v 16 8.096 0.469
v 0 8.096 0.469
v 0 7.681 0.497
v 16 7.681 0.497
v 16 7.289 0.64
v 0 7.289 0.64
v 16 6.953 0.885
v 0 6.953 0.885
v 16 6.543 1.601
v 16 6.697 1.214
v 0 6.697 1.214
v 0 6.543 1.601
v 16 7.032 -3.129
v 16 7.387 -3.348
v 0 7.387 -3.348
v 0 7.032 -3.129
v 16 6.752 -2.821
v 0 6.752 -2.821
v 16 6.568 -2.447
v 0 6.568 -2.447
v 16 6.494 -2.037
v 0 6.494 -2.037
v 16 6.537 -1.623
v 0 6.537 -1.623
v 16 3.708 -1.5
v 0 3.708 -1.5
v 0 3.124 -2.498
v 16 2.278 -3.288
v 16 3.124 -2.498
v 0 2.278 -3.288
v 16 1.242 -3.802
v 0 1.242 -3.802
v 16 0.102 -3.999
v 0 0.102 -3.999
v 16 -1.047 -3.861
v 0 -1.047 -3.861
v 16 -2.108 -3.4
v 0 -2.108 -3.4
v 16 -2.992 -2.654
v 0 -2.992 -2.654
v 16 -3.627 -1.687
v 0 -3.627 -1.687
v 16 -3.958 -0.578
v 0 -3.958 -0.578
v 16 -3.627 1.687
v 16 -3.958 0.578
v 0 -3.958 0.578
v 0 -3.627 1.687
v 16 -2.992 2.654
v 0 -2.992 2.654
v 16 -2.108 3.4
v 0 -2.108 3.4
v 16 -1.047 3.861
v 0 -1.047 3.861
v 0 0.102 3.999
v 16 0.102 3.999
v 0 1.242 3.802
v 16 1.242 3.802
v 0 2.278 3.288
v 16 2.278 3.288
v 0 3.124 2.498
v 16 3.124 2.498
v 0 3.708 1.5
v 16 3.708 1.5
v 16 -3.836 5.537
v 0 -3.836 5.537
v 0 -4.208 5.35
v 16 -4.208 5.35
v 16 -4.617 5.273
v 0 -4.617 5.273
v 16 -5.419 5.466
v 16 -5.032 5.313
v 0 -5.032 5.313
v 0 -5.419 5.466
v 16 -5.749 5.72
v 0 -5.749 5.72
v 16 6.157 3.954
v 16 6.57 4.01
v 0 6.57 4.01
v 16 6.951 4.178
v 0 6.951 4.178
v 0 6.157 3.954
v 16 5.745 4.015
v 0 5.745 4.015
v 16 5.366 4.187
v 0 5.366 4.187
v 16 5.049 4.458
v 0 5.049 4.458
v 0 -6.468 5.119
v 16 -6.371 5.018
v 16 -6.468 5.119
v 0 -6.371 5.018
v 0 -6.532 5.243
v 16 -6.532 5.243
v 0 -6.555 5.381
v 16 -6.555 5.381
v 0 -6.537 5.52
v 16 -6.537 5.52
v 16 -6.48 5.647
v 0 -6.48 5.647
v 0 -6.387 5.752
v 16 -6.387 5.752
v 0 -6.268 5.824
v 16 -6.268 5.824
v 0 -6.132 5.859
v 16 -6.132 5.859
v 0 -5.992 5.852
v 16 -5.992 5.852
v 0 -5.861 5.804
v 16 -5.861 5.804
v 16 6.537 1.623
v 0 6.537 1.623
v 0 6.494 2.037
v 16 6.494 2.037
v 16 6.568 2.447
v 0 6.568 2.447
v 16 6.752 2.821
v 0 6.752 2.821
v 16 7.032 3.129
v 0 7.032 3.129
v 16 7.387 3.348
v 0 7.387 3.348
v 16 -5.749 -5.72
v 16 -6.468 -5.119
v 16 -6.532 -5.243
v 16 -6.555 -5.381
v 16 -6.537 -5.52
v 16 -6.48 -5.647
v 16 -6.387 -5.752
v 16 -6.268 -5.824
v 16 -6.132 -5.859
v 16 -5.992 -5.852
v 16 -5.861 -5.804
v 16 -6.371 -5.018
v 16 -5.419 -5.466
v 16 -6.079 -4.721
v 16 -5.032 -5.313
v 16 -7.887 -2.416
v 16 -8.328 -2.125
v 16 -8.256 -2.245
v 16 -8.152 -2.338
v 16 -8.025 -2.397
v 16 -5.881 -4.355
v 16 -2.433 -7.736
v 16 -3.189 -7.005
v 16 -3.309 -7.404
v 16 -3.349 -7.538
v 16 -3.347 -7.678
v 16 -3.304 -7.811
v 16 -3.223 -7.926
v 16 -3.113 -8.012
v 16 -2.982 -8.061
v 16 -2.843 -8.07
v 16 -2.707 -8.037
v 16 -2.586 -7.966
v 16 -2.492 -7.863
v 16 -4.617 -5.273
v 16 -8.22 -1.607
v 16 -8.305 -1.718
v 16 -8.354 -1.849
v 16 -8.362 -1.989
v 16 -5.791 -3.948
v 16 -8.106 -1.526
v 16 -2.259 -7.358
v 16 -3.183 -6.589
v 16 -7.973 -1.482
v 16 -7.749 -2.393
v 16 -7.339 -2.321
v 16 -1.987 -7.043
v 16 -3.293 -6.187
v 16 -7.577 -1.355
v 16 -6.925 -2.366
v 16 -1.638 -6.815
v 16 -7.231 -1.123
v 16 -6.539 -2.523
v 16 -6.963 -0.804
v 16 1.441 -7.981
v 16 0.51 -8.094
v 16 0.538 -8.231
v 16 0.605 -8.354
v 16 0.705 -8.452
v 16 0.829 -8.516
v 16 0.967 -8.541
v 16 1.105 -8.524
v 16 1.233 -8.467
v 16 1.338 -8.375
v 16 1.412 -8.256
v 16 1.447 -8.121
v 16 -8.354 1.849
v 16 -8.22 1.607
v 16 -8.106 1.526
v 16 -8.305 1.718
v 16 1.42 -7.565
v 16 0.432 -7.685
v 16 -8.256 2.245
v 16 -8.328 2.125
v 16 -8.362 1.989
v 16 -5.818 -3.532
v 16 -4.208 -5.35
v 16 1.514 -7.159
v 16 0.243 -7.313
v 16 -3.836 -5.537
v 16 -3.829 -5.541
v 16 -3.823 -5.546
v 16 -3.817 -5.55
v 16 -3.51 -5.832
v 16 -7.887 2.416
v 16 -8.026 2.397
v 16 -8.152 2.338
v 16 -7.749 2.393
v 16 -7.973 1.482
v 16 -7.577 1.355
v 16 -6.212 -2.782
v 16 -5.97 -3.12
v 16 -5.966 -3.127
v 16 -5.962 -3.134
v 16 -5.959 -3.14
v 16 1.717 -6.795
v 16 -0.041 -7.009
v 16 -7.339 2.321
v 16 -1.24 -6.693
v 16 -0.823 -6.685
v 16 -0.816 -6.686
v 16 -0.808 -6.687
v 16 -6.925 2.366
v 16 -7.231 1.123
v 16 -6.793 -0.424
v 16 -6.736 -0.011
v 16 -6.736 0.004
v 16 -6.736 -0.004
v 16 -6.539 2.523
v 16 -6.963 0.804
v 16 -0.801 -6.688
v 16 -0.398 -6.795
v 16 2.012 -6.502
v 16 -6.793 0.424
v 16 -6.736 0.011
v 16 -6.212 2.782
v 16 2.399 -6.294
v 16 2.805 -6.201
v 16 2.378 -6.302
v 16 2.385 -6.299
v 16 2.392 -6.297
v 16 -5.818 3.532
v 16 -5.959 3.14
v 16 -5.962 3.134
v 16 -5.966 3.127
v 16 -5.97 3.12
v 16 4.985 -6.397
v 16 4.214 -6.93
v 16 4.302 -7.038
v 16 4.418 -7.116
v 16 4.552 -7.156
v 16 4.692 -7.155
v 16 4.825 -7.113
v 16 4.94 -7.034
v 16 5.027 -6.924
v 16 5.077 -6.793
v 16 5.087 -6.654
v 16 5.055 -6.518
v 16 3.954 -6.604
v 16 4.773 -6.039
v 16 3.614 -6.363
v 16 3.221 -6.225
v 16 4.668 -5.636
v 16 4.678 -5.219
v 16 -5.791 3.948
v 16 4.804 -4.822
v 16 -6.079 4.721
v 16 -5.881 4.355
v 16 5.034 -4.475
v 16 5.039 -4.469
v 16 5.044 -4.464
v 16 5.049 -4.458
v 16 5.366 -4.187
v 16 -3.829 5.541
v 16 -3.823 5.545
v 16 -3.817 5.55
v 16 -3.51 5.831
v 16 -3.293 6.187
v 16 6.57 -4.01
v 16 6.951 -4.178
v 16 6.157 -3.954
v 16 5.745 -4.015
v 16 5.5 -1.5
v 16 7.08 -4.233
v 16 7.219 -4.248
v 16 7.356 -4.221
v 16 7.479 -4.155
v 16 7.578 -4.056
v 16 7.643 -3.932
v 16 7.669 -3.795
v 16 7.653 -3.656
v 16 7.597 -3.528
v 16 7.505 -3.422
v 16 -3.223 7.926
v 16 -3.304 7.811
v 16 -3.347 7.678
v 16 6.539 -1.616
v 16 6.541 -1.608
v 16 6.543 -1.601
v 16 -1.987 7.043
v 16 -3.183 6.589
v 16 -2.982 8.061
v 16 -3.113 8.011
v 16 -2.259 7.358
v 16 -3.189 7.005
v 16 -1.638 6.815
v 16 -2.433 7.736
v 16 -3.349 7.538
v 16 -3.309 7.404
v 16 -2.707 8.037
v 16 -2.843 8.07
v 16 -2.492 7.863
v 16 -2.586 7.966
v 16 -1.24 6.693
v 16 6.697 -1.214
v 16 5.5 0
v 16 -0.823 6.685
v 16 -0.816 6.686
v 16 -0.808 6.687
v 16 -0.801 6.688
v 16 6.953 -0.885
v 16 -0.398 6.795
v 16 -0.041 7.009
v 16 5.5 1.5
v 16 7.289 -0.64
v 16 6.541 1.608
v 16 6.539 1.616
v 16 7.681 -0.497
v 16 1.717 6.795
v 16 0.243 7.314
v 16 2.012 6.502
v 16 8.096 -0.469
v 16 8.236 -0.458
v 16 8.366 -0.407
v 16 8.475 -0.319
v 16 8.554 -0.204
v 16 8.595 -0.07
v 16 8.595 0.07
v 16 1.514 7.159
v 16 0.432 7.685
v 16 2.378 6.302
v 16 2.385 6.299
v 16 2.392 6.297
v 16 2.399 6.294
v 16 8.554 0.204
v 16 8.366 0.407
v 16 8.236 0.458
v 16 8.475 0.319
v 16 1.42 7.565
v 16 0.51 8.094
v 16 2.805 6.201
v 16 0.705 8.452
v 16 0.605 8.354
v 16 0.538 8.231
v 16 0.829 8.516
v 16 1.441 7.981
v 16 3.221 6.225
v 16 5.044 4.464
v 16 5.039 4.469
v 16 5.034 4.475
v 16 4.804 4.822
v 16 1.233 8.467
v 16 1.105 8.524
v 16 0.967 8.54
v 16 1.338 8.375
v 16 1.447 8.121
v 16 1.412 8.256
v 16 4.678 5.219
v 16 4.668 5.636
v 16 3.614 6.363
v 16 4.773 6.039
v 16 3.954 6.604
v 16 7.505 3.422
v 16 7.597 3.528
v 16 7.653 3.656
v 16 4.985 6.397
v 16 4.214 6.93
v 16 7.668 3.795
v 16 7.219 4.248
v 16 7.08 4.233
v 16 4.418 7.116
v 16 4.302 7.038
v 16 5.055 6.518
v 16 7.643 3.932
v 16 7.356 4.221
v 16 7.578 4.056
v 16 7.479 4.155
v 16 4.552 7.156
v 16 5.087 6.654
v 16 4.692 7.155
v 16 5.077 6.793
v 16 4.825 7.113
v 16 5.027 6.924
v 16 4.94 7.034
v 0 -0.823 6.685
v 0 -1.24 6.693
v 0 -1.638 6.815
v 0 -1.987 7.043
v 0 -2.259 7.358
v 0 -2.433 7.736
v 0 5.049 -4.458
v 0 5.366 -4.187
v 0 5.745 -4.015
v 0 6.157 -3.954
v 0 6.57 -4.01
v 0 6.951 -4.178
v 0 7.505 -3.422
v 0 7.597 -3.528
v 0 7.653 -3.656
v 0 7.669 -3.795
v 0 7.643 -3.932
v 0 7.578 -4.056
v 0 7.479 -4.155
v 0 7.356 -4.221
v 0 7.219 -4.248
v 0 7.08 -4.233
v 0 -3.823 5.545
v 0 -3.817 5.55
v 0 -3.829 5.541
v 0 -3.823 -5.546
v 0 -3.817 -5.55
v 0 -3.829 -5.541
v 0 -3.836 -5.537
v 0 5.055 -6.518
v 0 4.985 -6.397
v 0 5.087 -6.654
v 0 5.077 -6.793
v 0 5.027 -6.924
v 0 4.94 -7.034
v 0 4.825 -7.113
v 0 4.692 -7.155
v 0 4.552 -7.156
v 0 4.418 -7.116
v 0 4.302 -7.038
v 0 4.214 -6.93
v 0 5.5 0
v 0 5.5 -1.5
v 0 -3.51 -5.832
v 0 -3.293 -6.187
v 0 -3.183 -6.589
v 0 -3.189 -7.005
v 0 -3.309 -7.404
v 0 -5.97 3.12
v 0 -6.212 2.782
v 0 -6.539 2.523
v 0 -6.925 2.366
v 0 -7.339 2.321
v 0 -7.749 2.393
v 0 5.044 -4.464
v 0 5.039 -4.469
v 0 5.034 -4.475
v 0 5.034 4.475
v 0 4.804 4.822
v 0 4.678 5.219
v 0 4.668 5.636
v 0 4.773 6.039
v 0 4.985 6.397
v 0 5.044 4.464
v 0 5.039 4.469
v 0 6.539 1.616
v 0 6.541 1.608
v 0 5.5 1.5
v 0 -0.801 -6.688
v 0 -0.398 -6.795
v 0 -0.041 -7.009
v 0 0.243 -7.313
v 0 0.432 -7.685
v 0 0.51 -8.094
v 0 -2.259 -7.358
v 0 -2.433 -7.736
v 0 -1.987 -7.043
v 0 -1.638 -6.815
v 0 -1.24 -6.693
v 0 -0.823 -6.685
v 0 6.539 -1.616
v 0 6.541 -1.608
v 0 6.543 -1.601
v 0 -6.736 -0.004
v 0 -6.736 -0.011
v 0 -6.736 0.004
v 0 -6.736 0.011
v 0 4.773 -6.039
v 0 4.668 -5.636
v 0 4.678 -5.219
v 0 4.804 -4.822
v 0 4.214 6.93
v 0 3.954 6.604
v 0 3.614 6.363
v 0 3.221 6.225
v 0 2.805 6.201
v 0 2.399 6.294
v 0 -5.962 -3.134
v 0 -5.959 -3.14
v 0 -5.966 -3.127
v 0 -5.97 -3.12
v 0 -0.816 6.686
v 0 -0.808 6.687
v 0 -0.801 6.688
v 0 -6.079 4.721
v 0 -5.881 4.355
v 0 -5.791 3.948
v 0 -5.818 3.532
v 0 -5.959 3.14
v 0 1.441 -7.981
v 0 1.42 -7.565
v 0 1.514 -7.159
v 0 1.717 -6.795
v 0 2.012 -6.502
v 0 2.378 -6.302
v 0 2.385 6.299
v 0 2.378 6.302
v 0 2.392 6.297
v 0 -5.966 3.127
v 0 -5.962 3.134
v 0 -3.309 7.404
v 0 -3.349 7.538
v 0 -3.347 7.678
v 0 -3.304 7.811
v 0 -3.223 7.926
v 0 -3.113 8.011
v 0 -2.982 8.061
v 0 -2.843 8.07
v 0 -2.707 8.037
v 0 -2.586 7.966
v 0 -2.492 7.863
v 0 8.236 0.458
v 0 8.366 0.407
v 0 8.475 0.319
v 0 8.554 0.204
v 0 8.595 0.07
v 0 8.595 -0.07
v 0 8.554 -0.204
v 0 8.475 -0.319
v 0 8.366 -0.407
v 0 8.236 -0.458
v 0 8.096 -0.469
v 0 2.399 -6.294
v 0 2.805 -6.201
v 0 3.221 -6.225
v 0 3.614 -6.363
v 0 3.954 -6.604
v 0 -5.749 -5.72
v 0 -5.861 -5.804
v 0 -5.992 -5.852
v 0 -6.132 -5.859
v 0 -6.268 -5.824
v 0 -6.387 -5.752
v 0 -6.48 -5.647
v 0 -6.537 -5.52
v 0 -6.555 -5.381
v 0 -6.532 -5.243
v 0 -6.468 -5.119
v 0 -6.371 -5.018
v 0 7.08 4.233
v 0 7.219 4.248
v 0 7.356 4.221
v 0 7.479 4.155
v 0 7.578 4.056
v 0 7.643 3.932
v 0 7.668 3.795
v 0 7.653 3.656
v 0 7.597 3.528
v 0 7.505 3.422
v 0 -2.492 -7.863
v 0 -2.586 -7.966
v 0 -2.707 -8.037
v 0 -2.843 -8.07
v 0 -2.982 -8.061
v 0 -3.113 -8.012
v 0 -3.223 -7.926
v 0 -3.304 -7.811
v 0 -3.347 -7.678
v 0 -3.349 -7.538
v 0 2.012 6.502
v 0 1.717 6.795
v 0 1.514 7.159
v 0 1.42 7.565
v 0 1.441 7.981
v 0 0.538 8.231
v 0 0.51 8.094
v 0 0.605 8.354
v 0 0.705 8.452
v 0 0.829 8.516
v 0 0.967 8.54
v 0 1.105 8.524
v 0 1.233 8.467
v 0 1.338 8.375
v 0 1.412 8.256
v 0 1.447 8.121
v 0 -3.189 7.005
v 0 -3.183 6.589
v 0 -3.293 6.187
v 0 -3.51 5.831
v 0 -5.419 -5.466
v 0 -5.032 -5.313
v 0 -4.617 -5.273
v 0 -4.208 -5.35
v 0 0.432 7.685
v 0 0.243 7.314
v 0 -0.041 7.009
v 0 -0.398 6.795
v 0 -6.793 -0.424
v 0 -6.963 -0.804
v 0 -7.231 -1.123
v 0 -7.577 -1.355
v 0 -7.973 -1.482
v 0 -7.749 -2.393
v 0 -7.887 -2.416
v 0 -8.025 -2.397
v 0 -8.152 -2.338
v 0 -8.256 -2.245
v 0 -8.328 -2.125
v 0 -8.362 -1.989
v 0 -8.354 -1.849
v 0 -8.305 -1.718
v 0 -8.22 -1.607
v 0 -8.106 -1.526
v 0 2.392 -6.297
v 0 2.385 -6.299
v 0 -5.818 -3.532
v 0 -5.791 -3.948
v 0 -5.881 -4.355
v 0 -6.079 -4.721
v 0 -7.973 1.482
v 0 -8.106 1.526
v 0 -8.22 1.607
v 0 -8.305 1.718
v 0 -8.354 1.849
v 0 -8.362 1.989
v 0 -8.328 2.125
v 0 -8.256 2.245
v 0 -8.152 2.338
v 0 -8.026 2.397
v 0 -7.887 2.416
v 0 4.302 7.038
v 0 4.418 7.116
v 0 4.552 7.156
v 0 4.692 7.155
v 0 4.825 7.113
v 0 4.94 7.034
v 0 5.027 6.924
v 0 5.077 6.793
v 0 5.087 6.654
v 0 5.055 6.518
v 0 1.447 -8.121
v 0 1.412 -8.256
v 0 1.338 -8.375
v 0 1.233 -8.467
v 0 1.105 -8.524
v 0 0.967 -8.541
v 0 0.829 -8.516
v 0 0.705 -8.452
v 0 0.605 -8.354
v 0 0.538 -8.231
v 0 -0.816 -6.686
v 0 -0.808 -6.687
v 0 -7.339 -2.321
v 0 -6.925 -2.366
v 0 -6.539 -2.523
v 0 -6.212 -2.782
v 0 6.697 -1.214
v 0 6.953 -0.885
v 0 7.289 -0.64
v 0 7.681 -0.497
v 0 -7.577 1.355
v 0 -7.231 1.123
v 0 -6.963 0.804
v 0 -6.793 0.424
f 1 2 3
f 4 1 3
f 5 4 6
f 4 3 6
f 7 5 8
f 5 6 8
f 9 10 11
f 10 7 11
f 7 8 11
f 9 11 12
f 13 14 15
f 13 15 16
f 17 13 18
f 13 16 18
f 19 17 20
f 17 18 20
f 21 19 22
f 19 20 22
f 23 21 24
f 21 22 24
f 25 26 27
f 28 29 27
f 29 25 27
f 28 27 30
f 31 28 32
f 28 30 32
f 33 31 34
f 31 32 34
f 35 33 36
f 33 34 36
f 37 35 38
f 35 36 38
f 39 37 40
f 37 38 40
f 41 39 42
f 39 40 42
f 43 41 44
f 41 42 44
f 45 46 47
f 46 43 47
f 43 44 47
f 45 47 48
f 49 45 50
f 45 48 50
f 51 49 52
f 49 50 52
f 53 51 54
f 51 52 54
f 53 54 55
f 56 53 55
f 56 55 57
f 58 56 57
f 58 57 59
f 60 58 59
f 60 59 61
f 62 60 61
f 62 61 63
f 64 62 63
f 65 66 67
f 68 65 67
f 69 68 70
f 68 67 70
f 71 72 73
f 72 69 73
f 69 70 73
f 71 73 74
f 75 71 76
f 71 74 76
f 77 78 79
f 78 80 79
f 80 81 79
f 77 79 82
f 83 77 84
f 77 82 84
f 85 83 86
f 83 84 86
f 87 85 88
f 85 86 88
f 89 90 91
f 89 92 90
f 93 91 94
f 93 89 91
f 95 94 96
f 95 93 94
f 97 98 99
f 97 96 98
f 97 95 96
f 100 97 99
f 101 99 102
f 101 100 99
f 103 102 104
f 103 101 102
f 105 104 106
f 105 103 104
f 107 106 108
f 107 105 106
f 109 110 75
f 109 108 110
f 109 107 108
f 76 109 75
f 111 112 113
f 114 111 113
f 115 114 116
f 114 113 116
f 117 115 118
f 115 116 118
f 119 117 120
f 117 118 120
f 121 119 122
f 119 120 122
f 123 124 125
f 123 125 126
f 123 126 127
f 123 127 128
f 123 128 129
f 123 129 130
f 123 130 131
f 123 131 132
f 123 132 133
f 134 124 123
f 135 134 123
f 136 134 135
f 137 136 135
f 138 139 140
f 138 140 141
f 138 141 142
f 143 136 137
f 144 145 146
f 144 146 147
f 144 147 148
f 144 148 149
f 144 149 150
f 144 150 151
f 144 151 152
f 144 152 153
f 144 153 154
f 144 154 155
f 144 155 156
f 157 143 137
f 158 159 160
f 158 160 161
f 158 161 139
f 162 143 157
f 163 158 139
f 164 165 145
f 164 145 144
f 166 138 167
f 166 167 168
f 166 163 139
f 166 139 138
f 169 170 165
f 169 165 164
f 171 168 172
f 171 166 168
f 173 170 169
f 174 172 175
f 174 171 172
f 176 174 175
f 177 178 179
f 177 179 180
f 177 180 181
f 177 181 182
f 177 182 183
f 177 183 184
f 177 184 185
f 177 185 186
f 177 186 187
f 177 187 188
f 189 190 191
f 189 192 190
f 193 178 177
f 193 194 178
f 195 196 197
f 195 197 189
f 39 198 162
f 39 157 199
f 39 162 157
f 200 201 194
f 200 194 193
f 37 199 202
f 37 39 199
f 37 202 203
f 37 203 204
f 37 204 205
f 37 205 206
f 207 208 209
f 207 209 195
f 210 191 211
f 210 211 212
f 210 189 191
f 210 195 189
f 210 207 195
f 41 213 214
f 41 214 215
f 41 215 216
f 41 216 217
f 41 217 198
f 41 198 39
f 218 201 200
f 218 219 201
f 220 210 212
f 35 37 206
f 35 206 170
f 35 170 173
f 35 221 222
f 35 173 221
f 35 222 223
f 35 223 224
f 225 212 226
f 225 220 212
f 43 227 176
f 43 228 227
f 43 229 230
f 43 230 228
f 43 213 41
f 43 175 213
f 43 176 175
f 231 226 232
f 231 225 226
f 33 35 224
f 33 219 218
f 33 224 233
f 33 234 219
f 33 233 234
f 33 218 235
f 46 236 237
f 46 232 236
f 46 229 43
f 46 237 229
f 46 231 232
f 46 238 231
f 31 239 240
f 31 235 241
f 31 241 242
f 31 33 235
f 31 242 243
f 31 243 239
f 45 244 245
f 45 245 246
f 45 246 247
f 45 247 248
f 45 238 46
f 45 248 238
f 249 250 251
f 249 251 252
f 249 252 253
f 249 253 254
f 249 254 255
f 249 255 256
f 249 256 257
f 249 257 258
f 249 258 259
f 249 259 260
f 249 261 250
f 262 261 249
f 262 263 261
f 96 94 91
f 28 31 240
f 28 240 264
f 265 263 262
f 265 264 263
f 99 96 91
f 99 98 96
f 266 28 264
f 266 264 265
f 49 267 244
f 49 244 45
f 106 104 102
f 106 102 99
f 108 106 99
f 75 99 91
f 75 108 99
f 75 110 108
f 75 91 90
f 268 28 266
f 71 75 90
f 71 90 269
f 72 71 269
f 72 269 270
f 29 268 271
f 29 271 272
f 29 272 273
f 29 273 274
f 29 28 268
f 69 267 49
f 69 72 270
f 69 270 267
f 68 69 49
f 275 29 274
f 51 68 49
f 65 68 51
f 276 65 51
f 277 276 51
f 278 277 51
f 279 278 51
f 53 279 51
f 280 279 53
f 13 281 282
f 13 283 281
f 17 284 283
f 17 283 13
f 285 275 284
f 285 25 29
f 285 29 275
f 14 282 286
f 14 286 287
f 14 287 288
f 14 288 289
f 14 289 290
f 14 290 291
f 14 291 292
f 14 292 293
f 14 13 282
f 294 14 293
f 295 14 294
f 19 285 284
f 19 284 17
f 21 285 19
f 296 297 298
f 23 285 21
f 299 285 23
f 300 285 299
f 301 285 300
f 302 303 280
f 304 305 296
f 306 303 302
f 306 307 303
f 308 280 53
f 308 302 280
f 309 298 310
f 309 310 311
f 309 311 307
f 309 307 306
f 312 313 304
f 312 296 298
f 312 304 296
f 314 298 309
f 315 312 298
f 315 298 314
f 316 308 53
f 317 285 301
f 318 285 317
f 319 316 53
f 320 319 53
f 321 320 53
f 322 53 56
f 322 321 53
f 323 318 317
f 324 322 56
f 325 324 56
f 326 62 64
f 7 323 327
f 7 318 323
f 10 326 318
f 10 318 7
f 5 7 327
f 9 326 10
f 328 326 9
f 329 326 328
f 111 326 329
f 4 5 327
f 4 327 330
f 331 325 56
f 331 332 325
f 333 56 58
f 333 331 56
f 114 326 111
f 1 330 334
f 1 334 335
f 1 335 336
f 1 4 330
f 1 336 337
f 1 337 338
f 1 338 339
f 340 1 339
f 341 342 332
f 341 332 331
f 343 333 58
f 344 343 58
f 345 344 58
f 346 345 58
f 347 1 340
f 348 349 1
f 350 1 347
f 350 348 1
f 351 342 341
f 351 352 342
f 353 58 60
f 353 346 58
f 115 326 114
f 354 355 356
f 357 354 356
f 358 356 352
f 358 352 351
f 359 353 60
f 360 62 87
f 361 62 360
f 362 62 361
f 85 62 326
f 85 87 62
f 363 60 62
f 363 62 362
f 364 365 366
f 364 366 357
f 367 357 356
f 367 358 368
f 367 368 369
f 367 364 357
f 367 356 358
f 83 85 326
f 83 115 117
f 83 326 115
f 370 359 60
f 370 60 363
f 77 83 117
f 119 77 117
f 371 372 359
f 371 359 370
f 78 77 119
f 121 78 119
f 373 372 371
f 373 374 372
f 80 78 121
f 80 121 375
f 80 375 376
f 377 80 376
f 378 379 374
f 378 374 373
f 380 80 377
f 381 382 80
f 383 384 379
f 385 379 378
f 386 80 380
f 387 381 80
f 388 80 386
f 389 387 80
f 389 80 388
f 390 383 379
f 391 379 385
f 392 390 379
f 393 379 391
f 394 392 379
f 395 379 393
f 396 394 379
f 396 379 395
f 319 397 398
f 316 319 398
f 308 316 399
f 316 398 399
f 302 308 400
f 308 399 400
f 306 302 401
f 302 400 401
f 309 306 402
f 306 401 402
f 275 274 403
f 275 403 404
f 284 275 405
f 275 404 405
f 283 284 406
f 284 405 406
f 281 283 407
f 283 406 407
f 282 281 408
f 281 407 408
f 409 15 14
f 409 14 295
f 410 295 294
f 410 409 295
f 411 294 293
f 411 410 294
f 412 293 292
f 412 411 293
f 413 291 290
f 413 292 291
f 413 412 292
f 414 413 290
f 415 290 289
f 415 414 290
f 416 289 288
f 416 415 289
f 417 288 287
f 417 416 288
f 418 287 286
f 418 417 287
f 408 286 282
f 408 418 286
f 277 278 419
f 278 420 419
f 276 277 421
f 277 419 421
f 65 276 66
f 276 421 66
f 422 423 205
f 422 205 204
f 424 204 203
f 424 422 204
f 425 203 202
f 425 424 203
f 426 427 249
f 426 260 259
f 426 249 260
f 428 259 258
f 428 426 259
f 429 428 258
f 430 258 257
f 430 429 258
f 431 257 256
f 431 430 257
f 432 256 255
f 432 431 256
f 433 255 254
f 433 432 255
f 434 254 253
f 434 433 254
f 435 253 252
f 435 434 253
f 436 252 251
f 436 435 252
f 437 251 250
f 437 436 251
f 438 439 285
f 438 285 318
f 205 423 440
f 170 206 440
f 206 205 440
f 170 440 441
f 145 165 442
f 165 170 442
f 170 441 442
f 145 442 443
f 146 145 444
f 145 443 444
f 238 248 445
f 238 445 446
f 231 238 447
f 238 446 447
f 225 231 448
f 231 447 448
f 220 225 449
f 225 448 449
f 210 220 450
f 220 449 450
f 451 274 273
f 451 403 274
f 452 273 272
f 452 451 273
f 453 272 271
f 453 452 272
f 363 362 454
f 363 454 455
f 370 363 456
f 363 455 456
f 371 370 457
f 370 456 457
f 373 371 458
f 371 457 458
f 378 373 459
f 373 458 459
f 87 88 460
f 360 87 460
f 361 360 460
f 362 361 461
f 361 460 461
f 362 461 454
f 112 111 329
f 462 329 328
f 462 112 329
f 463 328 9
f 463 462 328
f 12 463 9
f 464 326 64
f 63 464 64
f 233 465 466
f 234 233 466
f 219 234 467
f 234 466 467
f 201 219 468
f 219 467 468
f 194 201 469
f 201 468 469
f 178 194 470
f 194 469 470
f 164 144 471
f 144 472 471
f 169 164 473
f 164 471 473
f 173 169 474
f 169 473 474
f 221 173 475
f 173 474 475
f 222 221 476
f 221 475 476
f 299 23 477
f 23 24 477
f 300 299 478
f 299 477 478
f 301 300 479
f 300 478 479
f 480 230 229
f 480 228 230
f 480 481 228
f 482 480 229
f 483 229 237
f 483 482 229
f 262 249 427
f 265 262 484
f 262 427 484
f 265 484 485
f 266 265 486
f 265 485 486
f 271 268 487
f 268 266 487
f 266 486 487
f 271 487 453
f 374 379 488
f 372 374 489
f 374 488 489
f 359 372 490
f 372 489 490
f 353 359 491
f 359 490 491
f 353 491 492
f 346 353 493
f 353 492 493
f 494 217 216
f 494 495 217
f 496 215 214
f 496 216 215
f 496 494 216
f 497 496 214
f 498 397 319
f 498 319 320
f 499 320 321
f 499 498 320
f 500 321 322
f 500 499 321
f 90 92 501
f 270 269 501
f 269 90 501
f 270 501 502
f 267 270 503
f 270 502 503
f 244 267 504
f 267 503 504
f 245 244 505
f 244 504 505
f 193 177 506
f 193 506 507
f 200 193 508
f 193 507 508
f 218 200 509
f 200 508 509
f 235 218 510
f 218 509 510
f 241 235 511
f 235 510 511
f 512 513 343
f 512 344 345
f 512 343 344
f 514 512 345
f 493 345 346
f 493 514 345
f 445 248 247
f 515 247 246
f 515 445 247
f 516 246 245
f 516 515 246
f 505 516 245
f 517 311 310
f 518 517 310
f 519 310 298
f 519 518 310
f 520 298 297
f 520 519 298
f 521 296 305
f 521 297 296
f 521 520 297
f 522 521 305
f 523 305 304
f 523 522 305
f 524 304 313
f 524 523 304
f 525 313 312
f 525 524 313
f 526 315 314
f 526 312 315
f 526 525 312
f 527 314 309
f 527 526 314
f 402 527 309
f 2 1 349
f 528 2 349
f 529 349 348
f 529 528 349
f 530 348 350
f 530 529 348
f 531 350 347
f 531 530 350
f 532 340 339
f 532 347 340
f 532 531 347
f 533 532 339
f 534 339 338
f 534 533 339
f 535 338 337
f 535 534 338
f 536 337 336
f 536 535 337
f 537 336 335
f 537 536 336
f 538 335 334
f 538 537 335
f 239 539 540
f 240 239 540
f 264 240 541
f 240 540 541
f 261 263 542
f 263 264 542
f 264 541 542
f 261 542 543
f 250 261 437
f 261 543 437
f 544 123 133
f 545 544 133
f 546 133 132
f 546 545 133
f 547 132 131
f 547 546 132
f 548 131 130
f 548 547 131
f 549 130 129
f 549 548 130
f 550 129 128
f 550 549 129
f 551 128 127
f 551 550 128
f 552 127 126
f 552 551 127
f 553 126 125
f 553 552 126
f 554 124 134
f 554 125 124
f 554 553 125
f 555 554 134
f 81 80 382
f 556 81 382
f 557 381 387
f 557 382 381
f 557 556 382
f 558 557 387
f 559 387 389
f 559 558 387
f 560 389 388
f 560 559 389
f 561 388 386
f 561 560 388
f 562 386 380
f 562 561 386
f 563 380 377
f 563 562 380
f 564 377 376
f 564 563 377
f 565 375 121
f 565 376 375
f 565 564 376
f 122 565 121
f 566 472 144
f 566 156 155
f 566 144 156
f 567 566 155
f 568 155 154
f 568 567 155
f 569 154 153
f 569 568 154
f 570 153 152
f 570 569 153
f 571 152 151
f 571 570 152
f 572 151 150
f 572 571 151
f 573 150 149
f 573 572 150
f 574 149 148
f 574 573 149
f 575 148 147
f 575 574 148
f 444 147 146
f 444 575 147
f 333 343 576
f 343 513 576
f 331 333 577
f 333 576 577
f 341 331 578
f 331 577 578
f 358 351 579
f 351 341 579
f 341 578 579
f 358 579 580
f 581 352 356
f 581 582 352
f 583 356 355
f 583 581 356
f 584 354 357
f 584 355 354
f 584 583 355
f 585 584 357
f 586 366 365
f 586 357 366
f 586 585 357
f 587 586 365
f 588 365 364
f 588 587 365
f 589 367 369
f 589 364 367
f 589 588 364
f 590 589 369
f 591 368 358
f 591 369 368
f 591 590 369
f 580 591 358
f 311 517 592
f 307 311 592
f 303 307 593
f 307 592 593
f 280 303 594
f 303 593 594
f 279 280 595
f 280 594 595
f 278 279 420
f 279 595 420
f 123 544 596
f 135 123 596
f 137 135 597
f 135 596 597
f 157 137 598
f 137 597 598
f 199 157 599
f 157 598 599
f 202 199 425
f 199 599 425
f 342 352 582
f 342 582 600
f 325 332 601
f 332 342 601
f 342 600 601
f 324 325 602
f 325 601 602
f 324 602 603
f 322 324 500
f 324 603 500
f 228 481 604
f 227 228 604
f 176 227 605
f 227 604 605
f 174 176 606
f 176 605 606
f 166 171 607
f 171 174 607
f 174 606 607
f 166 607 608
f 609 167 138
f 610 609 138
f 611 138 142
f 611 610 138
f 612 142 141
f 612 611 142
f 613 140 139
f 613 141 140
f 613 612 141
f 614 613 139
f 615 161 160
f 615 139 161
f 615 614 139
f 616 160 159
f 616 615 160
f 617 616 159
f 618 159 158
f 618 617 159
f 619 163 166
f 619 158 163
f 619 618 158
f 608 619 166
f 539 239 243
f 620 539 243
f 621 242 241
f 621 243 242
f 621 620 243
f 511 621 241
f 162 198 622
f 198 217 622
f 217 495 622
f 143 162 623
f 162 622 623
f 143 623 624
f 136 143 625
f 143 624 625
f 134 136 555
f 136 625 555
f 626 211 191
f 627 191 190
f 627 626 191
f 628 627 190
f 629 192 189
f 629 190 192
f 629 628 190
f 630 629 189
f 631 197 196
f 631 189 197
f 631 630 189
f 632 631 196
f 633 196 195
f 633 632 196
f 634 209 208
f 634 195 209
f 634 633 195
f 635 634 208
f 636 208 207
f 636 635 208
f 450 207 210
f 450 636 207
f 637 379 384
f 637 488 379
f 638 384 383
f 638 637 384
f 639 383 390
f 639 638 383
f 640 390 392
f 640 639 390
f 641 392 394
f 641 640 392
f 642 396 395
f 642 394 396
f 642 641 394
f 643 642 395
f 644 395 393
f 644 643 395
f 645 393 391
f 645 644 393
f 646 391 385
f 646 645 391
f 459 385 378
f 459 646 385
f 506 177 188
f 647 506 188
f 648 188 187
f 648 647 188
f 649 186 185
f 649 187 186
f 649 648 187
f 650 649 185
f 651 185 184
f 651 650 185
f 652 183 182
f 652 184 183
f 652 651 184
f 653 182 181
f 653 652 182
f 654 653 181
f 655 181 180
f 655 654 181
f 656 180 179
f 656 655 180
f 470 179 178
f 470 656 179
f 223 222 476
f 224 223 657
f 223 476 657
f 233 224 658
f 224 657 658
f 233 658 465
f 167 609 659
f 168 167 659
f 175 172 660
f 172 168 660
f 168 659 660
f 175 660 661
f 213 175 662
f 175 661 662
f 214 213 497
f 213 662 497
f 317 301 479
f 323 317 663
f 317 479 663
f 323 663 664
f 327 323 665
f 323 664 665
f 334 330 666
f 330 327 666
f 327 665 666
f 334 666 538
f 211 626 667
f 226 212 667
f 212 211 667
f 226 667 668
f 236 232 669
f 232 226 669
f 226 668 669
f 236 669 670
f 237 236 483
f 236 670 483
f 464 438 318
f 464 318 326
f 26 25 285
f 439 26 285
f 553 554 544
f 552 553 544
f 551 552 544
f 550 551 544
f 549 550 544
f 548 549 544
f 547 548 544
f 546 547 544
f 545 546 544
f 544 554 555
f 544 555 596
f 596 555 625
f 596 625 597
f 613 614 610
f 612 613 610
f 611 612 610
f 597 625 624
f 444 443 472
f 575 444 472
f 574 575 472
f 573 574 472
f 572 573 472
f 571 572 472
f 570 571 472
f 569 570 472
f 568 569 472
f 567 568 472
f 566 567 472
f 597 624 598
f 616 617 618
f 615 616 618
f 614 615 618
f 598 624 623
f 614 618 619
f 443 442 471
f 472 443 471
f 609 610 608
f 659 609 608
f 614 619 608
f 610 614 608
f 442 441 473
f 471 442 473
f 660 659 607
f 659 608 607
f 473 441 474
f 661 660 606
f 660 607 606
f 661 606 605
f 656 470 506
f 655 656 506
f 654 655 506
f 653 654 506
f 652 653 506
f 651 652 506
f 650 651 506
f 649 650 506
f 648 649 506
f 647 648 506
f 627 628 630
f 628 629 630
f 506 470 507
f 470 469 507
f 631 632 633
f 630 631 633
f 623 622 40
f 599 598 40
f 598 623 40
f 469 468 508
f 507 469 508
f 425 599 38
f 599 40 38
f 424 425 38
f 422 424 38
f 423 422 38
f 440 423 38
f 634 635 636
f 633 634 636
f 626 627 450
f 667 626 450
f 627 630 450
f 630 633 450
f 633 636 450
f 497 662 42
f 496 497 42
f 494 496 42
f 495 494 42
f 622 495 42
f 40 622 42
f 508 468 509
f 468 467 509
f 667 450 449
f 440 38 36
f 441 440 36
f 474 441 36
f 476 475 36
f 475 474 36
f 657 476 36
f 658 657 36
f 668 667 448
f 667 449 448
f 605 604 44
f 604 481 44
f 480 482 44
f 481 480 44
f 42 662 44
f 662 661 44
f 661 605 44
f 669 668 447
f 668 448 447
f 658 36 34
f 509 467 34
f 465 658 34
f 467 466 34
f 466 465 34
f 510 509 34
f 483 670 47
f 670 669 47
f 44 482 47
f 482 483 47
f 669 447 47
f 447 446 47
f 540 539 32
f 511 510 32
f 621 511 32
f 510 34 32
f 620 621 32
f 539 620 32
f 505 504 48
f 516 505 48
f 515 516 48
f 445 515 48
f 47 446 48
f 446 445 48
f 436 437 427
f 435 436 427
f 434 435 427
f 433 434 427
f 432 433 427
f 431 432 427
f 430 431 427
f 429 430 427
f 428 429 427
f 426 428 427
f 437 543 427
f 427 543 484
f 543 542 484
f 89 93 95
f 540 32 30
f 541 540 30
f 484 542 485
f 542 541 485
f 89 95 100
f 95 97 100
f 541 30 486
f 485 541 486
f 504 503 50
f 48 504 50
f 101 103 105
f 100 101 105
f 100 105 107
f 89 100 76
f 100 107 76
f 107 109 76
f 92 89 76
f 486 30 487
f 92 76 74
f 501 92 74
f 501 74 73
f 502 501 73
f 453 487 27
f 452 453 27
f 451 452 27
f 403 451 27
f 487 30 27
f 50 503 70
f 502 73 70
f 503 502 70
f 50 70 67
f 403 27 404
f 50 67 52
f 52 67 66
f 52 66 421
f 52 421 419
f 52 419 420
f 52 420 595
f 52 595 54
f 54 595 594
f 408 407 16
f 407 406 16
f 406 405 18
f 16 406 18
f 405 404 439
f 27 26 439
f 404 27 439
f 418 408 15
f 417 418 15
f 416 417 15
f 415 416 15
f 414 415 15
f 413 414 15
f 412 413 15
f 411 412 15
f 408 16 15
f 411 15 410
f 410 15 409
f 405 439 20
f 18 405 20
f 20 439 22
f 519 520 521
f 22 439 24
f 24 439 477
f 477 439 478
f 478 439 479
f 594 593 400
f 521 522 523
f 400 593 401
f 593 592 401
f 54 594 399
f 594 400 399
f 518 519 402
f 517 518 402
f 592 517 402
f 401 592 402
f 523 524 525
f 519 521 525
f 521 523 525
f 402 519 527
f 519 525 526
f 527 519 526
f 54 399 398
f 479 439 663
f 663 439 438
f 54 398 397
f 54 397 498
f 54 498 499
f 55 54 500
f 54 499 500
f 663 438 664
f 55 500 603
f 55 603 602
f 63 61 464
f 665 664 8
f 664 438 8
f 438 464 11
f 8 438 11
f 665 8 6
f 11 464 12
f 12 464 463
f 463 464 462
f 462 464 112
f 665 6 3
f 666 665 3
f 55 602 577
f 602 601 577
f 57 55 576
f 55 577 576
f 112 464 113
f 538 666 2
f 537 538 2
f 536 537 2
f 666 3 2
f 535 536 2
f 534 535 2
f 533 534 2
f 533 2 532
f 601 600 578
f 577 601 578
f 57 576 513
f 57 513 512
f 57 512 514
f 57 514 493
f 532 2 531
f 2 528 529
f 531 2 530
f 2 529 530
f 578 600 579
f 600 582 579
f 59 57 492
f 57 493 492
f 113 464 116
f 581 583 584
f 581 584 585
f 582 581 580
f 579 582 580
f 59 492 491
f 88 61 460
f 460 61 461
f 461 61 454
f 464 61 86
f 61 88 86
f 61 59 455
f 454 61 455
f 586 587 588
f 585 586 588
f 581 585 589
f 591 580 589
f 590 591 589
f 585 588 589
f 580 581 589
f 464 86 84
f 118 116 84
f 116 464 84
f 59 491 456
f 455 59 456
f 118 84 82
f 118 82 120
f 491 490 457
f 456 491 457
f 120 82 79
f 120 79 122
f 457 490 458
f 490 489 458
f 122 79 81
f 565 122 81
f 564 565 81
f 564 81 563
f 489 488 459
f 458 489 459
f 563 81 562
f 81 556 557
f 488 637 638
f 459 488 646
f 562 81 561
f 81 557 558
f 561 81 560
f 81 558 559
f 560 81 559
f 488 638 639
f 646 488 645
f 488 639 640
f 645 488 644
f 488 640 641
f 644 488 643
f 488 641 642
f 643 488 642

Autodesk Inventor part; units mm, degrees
ref_plane "YZ Plane" through (0, 0, 0) normal (1, 0, 0) x (0, 1, 0)
ref_plane "XZ Plane" through (0, 0, 0) normal (0, 1, 0) x (-1, 0, 0)
ref_plane "XY Plane" through (0, 0, 0) normal (0, 0, 1) x (1, 0, 0)
sketch "Sketch1" plane through (0, 0, 0) normal (1, 0, 0) x (0, 1, 0)
  arc A0 (3.7081, 1.5) -> (3.7081, -1.5) centre (0, 0) ccw
  arc A1 (6.5427, 1.6009) -> (8.0964, 0.4688) centre (7.99, 1.955) ccw
  arc A2 (8.0964, -0.4688) -> (6.5427, -1.6009) centre (7.99, -1.955) ccw
  arc A3 (8.0964, -0.4688) -> (8.0964, 0.4688) centre (8.13, 0) ccw
  arc A4 (5.0493, 4.458) -> (6.9512, 4.1777) centre (6.1663, 5.4442) ccw
  arc A5 (7.3869, 3.3475) -> (6.9512, 4.1777) centre (7.1988, 3.7782) ccw
  arc A6 (7.3869, 3.3475) -> (6.5372, 1.623) centre (7.9833, 1.9821) ccw
  arc A7 (2.3992, 6.2939) -> (4.2135, 6.9295) centre (2.9299, 7.6862) ccw
  arc A8 (4.9851, 6.3969) -> (4.2135, 6.9295) centre (4.6184, 6.6909) ccw
  arc A9 (4.9851, 6.3969) -> (5.0342, 4.4751) centre (6.1478, 5.4651) ccw
  arc A10 (-0.8006, 6.688) -> (0.5105, 8.0939) centre (-0.9777, 8.1674) ccw
  arc A11 (1.4413, 7.9809) -> (0.5105, 8.0939) centre (0.98, 8.0707) ccw
  arc A12 (1.4413, 7.9809) -> (2.3778, 6.302) centre (2.9038, 7.6961) ccw
  arc A13 (-3.8169, 5.5498) -> (-3.3094, 7.4041) centre (-4.6612, 6.7775) ccw
  arc A14 (-2.4327, 7.7365) -> (-3.3094, 7.4041) centre (-2.8829, 7.6017) ccw
  arc A15 (-2.4327, 7.7365) -> (-0.8232, 6.6852) centre (-1.0053, 8.164) ccw
  arc A16 (-5.9589, 3.1403) -> (-6.3711, 5.018) centre (-7.277, 3.835) ccw
  arc A17 (-5.7494, 5.7198) -> (-6.3711, 5.018) centre (-6.0854, 5.3912) ccw
  arc A18 (-5.7494, 5.7198) -> (-3.8357, 5.5369) centre (-4.6842, 6.7617) ccw
  arc A19 (-6.7357, 0.0114) -> (-7.9734, 1.4824) centre (-8.2257, 0.0139) ccw
  arc A20 (-7.749, 2.3928) -> (-7.9734, 1.4824) centre (-7.8938, 1.9456) ccw
  arc A21 (-7.749, 2.3928) -> (-5.9695, 3.1201) centre (-7.29, 3.8103) ccw
  arc A22 (-5.9695, -3.1201) -> (-7.749, -2.3928) centre (-7.29, -3.8103) ccw
  arc A23 (-7.9734, -1.4824) -> (-7.749, -2.3928) centre (-7.8938, -1.9456) ccw
  arc A24 (-7.9734, -1.4824) -> (-6.7357, -0.0114) centre (-8.2257, -0.0139) ccw
  arc A25 (-3.8357, -5.5369) -> (-5.7494, -5.7198) centre (-4.6842, -6.7617) ccw
  arc A26 (-6.3711, -5.018) -> (-5.7494, -5.7198) centre (-6.0854, -5.3912) ccw
  arc A27 (-6.3711, -5.018) -> (-5.9589, -3.1403) centre (-7.277, -3.835) ccw
  arc A28 (-0.8232, -6.6852) -> (-2.4327, -7.7365) centre (-1.0053, -8.164) ccw
  arc A29 (-3.3094, -7.4041) -> (-2.4327, -7.7365) centre (-2.8829, -7.6017) ccw
  arc A30 (-3.3094, -7.4041) -> (-3.8169, -5.5498) centre (-4.6612, -6.7775) ccw
  arc A31 (2.3778, -6.302) -> (1.4413, -7.9809) centre (2.9038, -7.6961) ccw
  arc A32 (0.5105, -8.0939) -> (1.4413, -7.9809) centre (0.98, -8.0707) ccw
  arc A33 (0.5105, -8.0939) -> (-0.8006, -6.688) centre (-0.9777, -8.1674) ccw
  arc A34 (5.0342, -4.4751) -> (4.9851, -6.3969) centre (6.1478, -5.4651) ccw
  arc A35 (4.2135, -6.9295) -> (4.9851, -6.3969) centre (4.6184, -6.6909) ccw
  arc A36 (4.2135, -6.9295) -> (2.3992, -6.2939) centre (2.9299, -7.6862) ccw
  arc A37 (6.5372, -1.623) -> (7.3869, -3.3475) centre (7.9833, -1.9821) ccw
  arc A38 (6.9512, -4.1777) -> (7.3869, -3.3475) centre (7.1988, -3.7782) ccw
  arc A39 (6.9512, -4.1777) -> (5.0493, -4.458) centre (6.1663, -5.4442) ccw
  arc A40 (6.5427, 1.6009) -> (6.5372, 1.623) centre (0, 0) ccw
  arc A41 (6.5372, -1.623) -> (6.5427, -1.6009) centre (0, 0) ccw
  arc A42 (5.0493, 4.458) -> (5.0342, 4.4751) centre (0, 0) ccw
  arc A43 (2.3992, 6.2939) -> (2.3778, 6.302) centre (0, 0) ccw
  arc A44 (-0.8006, 6.688) -> (-0.8232, 6.6852) centre (0, 0) ccw
  arc A45 (-3.8169, 5.5498) -> (-3.8357, 5.5369) centre (0, 0) ccw
  arc A46 (-5.9589, 3.1403) -> (-5.9695, 3.1201) centre (0, 0) ccw
  arc A47 (-6.7357, 0.0114) -> (-6.7357, -0.0114) centre (0, 0) ccw
  arc A48 (-5.9695, -3.1201) -> (-5.9589, -3.1403) centre (0, 0) ccw
  arc A49 (-3.8357, -5.5369) -> (-3.8169, -5.5498) centre (0, 0) ccw
  arc A50 (-0.8232, -6.6852) -> (-0.8006, -6.688) centre (0, 0) ccw
  arc A51 (2.3778, -6.302) -> (2.3992, -6.2939) centre (0, 0) ccw
  arc A52 (5.0342, -4.4751) -> (5.0493, -4.458) centre (0, 0) ccw
  line L0 (5.5, 0) -> (5.5, 1.5)
  line L1 (5.5, 1.5) -> (3.7081, 1.5)
  line L2 (3.7081, -1.5) -> (5.5, -1.5)
  line L3 (5.5, -1.5) -> (5.5, 0)
  dimension "d13" = 360
extrude "Extrusion2" add sketch "Sketch1" along normal blind 16
properties part number "MotorGear"
